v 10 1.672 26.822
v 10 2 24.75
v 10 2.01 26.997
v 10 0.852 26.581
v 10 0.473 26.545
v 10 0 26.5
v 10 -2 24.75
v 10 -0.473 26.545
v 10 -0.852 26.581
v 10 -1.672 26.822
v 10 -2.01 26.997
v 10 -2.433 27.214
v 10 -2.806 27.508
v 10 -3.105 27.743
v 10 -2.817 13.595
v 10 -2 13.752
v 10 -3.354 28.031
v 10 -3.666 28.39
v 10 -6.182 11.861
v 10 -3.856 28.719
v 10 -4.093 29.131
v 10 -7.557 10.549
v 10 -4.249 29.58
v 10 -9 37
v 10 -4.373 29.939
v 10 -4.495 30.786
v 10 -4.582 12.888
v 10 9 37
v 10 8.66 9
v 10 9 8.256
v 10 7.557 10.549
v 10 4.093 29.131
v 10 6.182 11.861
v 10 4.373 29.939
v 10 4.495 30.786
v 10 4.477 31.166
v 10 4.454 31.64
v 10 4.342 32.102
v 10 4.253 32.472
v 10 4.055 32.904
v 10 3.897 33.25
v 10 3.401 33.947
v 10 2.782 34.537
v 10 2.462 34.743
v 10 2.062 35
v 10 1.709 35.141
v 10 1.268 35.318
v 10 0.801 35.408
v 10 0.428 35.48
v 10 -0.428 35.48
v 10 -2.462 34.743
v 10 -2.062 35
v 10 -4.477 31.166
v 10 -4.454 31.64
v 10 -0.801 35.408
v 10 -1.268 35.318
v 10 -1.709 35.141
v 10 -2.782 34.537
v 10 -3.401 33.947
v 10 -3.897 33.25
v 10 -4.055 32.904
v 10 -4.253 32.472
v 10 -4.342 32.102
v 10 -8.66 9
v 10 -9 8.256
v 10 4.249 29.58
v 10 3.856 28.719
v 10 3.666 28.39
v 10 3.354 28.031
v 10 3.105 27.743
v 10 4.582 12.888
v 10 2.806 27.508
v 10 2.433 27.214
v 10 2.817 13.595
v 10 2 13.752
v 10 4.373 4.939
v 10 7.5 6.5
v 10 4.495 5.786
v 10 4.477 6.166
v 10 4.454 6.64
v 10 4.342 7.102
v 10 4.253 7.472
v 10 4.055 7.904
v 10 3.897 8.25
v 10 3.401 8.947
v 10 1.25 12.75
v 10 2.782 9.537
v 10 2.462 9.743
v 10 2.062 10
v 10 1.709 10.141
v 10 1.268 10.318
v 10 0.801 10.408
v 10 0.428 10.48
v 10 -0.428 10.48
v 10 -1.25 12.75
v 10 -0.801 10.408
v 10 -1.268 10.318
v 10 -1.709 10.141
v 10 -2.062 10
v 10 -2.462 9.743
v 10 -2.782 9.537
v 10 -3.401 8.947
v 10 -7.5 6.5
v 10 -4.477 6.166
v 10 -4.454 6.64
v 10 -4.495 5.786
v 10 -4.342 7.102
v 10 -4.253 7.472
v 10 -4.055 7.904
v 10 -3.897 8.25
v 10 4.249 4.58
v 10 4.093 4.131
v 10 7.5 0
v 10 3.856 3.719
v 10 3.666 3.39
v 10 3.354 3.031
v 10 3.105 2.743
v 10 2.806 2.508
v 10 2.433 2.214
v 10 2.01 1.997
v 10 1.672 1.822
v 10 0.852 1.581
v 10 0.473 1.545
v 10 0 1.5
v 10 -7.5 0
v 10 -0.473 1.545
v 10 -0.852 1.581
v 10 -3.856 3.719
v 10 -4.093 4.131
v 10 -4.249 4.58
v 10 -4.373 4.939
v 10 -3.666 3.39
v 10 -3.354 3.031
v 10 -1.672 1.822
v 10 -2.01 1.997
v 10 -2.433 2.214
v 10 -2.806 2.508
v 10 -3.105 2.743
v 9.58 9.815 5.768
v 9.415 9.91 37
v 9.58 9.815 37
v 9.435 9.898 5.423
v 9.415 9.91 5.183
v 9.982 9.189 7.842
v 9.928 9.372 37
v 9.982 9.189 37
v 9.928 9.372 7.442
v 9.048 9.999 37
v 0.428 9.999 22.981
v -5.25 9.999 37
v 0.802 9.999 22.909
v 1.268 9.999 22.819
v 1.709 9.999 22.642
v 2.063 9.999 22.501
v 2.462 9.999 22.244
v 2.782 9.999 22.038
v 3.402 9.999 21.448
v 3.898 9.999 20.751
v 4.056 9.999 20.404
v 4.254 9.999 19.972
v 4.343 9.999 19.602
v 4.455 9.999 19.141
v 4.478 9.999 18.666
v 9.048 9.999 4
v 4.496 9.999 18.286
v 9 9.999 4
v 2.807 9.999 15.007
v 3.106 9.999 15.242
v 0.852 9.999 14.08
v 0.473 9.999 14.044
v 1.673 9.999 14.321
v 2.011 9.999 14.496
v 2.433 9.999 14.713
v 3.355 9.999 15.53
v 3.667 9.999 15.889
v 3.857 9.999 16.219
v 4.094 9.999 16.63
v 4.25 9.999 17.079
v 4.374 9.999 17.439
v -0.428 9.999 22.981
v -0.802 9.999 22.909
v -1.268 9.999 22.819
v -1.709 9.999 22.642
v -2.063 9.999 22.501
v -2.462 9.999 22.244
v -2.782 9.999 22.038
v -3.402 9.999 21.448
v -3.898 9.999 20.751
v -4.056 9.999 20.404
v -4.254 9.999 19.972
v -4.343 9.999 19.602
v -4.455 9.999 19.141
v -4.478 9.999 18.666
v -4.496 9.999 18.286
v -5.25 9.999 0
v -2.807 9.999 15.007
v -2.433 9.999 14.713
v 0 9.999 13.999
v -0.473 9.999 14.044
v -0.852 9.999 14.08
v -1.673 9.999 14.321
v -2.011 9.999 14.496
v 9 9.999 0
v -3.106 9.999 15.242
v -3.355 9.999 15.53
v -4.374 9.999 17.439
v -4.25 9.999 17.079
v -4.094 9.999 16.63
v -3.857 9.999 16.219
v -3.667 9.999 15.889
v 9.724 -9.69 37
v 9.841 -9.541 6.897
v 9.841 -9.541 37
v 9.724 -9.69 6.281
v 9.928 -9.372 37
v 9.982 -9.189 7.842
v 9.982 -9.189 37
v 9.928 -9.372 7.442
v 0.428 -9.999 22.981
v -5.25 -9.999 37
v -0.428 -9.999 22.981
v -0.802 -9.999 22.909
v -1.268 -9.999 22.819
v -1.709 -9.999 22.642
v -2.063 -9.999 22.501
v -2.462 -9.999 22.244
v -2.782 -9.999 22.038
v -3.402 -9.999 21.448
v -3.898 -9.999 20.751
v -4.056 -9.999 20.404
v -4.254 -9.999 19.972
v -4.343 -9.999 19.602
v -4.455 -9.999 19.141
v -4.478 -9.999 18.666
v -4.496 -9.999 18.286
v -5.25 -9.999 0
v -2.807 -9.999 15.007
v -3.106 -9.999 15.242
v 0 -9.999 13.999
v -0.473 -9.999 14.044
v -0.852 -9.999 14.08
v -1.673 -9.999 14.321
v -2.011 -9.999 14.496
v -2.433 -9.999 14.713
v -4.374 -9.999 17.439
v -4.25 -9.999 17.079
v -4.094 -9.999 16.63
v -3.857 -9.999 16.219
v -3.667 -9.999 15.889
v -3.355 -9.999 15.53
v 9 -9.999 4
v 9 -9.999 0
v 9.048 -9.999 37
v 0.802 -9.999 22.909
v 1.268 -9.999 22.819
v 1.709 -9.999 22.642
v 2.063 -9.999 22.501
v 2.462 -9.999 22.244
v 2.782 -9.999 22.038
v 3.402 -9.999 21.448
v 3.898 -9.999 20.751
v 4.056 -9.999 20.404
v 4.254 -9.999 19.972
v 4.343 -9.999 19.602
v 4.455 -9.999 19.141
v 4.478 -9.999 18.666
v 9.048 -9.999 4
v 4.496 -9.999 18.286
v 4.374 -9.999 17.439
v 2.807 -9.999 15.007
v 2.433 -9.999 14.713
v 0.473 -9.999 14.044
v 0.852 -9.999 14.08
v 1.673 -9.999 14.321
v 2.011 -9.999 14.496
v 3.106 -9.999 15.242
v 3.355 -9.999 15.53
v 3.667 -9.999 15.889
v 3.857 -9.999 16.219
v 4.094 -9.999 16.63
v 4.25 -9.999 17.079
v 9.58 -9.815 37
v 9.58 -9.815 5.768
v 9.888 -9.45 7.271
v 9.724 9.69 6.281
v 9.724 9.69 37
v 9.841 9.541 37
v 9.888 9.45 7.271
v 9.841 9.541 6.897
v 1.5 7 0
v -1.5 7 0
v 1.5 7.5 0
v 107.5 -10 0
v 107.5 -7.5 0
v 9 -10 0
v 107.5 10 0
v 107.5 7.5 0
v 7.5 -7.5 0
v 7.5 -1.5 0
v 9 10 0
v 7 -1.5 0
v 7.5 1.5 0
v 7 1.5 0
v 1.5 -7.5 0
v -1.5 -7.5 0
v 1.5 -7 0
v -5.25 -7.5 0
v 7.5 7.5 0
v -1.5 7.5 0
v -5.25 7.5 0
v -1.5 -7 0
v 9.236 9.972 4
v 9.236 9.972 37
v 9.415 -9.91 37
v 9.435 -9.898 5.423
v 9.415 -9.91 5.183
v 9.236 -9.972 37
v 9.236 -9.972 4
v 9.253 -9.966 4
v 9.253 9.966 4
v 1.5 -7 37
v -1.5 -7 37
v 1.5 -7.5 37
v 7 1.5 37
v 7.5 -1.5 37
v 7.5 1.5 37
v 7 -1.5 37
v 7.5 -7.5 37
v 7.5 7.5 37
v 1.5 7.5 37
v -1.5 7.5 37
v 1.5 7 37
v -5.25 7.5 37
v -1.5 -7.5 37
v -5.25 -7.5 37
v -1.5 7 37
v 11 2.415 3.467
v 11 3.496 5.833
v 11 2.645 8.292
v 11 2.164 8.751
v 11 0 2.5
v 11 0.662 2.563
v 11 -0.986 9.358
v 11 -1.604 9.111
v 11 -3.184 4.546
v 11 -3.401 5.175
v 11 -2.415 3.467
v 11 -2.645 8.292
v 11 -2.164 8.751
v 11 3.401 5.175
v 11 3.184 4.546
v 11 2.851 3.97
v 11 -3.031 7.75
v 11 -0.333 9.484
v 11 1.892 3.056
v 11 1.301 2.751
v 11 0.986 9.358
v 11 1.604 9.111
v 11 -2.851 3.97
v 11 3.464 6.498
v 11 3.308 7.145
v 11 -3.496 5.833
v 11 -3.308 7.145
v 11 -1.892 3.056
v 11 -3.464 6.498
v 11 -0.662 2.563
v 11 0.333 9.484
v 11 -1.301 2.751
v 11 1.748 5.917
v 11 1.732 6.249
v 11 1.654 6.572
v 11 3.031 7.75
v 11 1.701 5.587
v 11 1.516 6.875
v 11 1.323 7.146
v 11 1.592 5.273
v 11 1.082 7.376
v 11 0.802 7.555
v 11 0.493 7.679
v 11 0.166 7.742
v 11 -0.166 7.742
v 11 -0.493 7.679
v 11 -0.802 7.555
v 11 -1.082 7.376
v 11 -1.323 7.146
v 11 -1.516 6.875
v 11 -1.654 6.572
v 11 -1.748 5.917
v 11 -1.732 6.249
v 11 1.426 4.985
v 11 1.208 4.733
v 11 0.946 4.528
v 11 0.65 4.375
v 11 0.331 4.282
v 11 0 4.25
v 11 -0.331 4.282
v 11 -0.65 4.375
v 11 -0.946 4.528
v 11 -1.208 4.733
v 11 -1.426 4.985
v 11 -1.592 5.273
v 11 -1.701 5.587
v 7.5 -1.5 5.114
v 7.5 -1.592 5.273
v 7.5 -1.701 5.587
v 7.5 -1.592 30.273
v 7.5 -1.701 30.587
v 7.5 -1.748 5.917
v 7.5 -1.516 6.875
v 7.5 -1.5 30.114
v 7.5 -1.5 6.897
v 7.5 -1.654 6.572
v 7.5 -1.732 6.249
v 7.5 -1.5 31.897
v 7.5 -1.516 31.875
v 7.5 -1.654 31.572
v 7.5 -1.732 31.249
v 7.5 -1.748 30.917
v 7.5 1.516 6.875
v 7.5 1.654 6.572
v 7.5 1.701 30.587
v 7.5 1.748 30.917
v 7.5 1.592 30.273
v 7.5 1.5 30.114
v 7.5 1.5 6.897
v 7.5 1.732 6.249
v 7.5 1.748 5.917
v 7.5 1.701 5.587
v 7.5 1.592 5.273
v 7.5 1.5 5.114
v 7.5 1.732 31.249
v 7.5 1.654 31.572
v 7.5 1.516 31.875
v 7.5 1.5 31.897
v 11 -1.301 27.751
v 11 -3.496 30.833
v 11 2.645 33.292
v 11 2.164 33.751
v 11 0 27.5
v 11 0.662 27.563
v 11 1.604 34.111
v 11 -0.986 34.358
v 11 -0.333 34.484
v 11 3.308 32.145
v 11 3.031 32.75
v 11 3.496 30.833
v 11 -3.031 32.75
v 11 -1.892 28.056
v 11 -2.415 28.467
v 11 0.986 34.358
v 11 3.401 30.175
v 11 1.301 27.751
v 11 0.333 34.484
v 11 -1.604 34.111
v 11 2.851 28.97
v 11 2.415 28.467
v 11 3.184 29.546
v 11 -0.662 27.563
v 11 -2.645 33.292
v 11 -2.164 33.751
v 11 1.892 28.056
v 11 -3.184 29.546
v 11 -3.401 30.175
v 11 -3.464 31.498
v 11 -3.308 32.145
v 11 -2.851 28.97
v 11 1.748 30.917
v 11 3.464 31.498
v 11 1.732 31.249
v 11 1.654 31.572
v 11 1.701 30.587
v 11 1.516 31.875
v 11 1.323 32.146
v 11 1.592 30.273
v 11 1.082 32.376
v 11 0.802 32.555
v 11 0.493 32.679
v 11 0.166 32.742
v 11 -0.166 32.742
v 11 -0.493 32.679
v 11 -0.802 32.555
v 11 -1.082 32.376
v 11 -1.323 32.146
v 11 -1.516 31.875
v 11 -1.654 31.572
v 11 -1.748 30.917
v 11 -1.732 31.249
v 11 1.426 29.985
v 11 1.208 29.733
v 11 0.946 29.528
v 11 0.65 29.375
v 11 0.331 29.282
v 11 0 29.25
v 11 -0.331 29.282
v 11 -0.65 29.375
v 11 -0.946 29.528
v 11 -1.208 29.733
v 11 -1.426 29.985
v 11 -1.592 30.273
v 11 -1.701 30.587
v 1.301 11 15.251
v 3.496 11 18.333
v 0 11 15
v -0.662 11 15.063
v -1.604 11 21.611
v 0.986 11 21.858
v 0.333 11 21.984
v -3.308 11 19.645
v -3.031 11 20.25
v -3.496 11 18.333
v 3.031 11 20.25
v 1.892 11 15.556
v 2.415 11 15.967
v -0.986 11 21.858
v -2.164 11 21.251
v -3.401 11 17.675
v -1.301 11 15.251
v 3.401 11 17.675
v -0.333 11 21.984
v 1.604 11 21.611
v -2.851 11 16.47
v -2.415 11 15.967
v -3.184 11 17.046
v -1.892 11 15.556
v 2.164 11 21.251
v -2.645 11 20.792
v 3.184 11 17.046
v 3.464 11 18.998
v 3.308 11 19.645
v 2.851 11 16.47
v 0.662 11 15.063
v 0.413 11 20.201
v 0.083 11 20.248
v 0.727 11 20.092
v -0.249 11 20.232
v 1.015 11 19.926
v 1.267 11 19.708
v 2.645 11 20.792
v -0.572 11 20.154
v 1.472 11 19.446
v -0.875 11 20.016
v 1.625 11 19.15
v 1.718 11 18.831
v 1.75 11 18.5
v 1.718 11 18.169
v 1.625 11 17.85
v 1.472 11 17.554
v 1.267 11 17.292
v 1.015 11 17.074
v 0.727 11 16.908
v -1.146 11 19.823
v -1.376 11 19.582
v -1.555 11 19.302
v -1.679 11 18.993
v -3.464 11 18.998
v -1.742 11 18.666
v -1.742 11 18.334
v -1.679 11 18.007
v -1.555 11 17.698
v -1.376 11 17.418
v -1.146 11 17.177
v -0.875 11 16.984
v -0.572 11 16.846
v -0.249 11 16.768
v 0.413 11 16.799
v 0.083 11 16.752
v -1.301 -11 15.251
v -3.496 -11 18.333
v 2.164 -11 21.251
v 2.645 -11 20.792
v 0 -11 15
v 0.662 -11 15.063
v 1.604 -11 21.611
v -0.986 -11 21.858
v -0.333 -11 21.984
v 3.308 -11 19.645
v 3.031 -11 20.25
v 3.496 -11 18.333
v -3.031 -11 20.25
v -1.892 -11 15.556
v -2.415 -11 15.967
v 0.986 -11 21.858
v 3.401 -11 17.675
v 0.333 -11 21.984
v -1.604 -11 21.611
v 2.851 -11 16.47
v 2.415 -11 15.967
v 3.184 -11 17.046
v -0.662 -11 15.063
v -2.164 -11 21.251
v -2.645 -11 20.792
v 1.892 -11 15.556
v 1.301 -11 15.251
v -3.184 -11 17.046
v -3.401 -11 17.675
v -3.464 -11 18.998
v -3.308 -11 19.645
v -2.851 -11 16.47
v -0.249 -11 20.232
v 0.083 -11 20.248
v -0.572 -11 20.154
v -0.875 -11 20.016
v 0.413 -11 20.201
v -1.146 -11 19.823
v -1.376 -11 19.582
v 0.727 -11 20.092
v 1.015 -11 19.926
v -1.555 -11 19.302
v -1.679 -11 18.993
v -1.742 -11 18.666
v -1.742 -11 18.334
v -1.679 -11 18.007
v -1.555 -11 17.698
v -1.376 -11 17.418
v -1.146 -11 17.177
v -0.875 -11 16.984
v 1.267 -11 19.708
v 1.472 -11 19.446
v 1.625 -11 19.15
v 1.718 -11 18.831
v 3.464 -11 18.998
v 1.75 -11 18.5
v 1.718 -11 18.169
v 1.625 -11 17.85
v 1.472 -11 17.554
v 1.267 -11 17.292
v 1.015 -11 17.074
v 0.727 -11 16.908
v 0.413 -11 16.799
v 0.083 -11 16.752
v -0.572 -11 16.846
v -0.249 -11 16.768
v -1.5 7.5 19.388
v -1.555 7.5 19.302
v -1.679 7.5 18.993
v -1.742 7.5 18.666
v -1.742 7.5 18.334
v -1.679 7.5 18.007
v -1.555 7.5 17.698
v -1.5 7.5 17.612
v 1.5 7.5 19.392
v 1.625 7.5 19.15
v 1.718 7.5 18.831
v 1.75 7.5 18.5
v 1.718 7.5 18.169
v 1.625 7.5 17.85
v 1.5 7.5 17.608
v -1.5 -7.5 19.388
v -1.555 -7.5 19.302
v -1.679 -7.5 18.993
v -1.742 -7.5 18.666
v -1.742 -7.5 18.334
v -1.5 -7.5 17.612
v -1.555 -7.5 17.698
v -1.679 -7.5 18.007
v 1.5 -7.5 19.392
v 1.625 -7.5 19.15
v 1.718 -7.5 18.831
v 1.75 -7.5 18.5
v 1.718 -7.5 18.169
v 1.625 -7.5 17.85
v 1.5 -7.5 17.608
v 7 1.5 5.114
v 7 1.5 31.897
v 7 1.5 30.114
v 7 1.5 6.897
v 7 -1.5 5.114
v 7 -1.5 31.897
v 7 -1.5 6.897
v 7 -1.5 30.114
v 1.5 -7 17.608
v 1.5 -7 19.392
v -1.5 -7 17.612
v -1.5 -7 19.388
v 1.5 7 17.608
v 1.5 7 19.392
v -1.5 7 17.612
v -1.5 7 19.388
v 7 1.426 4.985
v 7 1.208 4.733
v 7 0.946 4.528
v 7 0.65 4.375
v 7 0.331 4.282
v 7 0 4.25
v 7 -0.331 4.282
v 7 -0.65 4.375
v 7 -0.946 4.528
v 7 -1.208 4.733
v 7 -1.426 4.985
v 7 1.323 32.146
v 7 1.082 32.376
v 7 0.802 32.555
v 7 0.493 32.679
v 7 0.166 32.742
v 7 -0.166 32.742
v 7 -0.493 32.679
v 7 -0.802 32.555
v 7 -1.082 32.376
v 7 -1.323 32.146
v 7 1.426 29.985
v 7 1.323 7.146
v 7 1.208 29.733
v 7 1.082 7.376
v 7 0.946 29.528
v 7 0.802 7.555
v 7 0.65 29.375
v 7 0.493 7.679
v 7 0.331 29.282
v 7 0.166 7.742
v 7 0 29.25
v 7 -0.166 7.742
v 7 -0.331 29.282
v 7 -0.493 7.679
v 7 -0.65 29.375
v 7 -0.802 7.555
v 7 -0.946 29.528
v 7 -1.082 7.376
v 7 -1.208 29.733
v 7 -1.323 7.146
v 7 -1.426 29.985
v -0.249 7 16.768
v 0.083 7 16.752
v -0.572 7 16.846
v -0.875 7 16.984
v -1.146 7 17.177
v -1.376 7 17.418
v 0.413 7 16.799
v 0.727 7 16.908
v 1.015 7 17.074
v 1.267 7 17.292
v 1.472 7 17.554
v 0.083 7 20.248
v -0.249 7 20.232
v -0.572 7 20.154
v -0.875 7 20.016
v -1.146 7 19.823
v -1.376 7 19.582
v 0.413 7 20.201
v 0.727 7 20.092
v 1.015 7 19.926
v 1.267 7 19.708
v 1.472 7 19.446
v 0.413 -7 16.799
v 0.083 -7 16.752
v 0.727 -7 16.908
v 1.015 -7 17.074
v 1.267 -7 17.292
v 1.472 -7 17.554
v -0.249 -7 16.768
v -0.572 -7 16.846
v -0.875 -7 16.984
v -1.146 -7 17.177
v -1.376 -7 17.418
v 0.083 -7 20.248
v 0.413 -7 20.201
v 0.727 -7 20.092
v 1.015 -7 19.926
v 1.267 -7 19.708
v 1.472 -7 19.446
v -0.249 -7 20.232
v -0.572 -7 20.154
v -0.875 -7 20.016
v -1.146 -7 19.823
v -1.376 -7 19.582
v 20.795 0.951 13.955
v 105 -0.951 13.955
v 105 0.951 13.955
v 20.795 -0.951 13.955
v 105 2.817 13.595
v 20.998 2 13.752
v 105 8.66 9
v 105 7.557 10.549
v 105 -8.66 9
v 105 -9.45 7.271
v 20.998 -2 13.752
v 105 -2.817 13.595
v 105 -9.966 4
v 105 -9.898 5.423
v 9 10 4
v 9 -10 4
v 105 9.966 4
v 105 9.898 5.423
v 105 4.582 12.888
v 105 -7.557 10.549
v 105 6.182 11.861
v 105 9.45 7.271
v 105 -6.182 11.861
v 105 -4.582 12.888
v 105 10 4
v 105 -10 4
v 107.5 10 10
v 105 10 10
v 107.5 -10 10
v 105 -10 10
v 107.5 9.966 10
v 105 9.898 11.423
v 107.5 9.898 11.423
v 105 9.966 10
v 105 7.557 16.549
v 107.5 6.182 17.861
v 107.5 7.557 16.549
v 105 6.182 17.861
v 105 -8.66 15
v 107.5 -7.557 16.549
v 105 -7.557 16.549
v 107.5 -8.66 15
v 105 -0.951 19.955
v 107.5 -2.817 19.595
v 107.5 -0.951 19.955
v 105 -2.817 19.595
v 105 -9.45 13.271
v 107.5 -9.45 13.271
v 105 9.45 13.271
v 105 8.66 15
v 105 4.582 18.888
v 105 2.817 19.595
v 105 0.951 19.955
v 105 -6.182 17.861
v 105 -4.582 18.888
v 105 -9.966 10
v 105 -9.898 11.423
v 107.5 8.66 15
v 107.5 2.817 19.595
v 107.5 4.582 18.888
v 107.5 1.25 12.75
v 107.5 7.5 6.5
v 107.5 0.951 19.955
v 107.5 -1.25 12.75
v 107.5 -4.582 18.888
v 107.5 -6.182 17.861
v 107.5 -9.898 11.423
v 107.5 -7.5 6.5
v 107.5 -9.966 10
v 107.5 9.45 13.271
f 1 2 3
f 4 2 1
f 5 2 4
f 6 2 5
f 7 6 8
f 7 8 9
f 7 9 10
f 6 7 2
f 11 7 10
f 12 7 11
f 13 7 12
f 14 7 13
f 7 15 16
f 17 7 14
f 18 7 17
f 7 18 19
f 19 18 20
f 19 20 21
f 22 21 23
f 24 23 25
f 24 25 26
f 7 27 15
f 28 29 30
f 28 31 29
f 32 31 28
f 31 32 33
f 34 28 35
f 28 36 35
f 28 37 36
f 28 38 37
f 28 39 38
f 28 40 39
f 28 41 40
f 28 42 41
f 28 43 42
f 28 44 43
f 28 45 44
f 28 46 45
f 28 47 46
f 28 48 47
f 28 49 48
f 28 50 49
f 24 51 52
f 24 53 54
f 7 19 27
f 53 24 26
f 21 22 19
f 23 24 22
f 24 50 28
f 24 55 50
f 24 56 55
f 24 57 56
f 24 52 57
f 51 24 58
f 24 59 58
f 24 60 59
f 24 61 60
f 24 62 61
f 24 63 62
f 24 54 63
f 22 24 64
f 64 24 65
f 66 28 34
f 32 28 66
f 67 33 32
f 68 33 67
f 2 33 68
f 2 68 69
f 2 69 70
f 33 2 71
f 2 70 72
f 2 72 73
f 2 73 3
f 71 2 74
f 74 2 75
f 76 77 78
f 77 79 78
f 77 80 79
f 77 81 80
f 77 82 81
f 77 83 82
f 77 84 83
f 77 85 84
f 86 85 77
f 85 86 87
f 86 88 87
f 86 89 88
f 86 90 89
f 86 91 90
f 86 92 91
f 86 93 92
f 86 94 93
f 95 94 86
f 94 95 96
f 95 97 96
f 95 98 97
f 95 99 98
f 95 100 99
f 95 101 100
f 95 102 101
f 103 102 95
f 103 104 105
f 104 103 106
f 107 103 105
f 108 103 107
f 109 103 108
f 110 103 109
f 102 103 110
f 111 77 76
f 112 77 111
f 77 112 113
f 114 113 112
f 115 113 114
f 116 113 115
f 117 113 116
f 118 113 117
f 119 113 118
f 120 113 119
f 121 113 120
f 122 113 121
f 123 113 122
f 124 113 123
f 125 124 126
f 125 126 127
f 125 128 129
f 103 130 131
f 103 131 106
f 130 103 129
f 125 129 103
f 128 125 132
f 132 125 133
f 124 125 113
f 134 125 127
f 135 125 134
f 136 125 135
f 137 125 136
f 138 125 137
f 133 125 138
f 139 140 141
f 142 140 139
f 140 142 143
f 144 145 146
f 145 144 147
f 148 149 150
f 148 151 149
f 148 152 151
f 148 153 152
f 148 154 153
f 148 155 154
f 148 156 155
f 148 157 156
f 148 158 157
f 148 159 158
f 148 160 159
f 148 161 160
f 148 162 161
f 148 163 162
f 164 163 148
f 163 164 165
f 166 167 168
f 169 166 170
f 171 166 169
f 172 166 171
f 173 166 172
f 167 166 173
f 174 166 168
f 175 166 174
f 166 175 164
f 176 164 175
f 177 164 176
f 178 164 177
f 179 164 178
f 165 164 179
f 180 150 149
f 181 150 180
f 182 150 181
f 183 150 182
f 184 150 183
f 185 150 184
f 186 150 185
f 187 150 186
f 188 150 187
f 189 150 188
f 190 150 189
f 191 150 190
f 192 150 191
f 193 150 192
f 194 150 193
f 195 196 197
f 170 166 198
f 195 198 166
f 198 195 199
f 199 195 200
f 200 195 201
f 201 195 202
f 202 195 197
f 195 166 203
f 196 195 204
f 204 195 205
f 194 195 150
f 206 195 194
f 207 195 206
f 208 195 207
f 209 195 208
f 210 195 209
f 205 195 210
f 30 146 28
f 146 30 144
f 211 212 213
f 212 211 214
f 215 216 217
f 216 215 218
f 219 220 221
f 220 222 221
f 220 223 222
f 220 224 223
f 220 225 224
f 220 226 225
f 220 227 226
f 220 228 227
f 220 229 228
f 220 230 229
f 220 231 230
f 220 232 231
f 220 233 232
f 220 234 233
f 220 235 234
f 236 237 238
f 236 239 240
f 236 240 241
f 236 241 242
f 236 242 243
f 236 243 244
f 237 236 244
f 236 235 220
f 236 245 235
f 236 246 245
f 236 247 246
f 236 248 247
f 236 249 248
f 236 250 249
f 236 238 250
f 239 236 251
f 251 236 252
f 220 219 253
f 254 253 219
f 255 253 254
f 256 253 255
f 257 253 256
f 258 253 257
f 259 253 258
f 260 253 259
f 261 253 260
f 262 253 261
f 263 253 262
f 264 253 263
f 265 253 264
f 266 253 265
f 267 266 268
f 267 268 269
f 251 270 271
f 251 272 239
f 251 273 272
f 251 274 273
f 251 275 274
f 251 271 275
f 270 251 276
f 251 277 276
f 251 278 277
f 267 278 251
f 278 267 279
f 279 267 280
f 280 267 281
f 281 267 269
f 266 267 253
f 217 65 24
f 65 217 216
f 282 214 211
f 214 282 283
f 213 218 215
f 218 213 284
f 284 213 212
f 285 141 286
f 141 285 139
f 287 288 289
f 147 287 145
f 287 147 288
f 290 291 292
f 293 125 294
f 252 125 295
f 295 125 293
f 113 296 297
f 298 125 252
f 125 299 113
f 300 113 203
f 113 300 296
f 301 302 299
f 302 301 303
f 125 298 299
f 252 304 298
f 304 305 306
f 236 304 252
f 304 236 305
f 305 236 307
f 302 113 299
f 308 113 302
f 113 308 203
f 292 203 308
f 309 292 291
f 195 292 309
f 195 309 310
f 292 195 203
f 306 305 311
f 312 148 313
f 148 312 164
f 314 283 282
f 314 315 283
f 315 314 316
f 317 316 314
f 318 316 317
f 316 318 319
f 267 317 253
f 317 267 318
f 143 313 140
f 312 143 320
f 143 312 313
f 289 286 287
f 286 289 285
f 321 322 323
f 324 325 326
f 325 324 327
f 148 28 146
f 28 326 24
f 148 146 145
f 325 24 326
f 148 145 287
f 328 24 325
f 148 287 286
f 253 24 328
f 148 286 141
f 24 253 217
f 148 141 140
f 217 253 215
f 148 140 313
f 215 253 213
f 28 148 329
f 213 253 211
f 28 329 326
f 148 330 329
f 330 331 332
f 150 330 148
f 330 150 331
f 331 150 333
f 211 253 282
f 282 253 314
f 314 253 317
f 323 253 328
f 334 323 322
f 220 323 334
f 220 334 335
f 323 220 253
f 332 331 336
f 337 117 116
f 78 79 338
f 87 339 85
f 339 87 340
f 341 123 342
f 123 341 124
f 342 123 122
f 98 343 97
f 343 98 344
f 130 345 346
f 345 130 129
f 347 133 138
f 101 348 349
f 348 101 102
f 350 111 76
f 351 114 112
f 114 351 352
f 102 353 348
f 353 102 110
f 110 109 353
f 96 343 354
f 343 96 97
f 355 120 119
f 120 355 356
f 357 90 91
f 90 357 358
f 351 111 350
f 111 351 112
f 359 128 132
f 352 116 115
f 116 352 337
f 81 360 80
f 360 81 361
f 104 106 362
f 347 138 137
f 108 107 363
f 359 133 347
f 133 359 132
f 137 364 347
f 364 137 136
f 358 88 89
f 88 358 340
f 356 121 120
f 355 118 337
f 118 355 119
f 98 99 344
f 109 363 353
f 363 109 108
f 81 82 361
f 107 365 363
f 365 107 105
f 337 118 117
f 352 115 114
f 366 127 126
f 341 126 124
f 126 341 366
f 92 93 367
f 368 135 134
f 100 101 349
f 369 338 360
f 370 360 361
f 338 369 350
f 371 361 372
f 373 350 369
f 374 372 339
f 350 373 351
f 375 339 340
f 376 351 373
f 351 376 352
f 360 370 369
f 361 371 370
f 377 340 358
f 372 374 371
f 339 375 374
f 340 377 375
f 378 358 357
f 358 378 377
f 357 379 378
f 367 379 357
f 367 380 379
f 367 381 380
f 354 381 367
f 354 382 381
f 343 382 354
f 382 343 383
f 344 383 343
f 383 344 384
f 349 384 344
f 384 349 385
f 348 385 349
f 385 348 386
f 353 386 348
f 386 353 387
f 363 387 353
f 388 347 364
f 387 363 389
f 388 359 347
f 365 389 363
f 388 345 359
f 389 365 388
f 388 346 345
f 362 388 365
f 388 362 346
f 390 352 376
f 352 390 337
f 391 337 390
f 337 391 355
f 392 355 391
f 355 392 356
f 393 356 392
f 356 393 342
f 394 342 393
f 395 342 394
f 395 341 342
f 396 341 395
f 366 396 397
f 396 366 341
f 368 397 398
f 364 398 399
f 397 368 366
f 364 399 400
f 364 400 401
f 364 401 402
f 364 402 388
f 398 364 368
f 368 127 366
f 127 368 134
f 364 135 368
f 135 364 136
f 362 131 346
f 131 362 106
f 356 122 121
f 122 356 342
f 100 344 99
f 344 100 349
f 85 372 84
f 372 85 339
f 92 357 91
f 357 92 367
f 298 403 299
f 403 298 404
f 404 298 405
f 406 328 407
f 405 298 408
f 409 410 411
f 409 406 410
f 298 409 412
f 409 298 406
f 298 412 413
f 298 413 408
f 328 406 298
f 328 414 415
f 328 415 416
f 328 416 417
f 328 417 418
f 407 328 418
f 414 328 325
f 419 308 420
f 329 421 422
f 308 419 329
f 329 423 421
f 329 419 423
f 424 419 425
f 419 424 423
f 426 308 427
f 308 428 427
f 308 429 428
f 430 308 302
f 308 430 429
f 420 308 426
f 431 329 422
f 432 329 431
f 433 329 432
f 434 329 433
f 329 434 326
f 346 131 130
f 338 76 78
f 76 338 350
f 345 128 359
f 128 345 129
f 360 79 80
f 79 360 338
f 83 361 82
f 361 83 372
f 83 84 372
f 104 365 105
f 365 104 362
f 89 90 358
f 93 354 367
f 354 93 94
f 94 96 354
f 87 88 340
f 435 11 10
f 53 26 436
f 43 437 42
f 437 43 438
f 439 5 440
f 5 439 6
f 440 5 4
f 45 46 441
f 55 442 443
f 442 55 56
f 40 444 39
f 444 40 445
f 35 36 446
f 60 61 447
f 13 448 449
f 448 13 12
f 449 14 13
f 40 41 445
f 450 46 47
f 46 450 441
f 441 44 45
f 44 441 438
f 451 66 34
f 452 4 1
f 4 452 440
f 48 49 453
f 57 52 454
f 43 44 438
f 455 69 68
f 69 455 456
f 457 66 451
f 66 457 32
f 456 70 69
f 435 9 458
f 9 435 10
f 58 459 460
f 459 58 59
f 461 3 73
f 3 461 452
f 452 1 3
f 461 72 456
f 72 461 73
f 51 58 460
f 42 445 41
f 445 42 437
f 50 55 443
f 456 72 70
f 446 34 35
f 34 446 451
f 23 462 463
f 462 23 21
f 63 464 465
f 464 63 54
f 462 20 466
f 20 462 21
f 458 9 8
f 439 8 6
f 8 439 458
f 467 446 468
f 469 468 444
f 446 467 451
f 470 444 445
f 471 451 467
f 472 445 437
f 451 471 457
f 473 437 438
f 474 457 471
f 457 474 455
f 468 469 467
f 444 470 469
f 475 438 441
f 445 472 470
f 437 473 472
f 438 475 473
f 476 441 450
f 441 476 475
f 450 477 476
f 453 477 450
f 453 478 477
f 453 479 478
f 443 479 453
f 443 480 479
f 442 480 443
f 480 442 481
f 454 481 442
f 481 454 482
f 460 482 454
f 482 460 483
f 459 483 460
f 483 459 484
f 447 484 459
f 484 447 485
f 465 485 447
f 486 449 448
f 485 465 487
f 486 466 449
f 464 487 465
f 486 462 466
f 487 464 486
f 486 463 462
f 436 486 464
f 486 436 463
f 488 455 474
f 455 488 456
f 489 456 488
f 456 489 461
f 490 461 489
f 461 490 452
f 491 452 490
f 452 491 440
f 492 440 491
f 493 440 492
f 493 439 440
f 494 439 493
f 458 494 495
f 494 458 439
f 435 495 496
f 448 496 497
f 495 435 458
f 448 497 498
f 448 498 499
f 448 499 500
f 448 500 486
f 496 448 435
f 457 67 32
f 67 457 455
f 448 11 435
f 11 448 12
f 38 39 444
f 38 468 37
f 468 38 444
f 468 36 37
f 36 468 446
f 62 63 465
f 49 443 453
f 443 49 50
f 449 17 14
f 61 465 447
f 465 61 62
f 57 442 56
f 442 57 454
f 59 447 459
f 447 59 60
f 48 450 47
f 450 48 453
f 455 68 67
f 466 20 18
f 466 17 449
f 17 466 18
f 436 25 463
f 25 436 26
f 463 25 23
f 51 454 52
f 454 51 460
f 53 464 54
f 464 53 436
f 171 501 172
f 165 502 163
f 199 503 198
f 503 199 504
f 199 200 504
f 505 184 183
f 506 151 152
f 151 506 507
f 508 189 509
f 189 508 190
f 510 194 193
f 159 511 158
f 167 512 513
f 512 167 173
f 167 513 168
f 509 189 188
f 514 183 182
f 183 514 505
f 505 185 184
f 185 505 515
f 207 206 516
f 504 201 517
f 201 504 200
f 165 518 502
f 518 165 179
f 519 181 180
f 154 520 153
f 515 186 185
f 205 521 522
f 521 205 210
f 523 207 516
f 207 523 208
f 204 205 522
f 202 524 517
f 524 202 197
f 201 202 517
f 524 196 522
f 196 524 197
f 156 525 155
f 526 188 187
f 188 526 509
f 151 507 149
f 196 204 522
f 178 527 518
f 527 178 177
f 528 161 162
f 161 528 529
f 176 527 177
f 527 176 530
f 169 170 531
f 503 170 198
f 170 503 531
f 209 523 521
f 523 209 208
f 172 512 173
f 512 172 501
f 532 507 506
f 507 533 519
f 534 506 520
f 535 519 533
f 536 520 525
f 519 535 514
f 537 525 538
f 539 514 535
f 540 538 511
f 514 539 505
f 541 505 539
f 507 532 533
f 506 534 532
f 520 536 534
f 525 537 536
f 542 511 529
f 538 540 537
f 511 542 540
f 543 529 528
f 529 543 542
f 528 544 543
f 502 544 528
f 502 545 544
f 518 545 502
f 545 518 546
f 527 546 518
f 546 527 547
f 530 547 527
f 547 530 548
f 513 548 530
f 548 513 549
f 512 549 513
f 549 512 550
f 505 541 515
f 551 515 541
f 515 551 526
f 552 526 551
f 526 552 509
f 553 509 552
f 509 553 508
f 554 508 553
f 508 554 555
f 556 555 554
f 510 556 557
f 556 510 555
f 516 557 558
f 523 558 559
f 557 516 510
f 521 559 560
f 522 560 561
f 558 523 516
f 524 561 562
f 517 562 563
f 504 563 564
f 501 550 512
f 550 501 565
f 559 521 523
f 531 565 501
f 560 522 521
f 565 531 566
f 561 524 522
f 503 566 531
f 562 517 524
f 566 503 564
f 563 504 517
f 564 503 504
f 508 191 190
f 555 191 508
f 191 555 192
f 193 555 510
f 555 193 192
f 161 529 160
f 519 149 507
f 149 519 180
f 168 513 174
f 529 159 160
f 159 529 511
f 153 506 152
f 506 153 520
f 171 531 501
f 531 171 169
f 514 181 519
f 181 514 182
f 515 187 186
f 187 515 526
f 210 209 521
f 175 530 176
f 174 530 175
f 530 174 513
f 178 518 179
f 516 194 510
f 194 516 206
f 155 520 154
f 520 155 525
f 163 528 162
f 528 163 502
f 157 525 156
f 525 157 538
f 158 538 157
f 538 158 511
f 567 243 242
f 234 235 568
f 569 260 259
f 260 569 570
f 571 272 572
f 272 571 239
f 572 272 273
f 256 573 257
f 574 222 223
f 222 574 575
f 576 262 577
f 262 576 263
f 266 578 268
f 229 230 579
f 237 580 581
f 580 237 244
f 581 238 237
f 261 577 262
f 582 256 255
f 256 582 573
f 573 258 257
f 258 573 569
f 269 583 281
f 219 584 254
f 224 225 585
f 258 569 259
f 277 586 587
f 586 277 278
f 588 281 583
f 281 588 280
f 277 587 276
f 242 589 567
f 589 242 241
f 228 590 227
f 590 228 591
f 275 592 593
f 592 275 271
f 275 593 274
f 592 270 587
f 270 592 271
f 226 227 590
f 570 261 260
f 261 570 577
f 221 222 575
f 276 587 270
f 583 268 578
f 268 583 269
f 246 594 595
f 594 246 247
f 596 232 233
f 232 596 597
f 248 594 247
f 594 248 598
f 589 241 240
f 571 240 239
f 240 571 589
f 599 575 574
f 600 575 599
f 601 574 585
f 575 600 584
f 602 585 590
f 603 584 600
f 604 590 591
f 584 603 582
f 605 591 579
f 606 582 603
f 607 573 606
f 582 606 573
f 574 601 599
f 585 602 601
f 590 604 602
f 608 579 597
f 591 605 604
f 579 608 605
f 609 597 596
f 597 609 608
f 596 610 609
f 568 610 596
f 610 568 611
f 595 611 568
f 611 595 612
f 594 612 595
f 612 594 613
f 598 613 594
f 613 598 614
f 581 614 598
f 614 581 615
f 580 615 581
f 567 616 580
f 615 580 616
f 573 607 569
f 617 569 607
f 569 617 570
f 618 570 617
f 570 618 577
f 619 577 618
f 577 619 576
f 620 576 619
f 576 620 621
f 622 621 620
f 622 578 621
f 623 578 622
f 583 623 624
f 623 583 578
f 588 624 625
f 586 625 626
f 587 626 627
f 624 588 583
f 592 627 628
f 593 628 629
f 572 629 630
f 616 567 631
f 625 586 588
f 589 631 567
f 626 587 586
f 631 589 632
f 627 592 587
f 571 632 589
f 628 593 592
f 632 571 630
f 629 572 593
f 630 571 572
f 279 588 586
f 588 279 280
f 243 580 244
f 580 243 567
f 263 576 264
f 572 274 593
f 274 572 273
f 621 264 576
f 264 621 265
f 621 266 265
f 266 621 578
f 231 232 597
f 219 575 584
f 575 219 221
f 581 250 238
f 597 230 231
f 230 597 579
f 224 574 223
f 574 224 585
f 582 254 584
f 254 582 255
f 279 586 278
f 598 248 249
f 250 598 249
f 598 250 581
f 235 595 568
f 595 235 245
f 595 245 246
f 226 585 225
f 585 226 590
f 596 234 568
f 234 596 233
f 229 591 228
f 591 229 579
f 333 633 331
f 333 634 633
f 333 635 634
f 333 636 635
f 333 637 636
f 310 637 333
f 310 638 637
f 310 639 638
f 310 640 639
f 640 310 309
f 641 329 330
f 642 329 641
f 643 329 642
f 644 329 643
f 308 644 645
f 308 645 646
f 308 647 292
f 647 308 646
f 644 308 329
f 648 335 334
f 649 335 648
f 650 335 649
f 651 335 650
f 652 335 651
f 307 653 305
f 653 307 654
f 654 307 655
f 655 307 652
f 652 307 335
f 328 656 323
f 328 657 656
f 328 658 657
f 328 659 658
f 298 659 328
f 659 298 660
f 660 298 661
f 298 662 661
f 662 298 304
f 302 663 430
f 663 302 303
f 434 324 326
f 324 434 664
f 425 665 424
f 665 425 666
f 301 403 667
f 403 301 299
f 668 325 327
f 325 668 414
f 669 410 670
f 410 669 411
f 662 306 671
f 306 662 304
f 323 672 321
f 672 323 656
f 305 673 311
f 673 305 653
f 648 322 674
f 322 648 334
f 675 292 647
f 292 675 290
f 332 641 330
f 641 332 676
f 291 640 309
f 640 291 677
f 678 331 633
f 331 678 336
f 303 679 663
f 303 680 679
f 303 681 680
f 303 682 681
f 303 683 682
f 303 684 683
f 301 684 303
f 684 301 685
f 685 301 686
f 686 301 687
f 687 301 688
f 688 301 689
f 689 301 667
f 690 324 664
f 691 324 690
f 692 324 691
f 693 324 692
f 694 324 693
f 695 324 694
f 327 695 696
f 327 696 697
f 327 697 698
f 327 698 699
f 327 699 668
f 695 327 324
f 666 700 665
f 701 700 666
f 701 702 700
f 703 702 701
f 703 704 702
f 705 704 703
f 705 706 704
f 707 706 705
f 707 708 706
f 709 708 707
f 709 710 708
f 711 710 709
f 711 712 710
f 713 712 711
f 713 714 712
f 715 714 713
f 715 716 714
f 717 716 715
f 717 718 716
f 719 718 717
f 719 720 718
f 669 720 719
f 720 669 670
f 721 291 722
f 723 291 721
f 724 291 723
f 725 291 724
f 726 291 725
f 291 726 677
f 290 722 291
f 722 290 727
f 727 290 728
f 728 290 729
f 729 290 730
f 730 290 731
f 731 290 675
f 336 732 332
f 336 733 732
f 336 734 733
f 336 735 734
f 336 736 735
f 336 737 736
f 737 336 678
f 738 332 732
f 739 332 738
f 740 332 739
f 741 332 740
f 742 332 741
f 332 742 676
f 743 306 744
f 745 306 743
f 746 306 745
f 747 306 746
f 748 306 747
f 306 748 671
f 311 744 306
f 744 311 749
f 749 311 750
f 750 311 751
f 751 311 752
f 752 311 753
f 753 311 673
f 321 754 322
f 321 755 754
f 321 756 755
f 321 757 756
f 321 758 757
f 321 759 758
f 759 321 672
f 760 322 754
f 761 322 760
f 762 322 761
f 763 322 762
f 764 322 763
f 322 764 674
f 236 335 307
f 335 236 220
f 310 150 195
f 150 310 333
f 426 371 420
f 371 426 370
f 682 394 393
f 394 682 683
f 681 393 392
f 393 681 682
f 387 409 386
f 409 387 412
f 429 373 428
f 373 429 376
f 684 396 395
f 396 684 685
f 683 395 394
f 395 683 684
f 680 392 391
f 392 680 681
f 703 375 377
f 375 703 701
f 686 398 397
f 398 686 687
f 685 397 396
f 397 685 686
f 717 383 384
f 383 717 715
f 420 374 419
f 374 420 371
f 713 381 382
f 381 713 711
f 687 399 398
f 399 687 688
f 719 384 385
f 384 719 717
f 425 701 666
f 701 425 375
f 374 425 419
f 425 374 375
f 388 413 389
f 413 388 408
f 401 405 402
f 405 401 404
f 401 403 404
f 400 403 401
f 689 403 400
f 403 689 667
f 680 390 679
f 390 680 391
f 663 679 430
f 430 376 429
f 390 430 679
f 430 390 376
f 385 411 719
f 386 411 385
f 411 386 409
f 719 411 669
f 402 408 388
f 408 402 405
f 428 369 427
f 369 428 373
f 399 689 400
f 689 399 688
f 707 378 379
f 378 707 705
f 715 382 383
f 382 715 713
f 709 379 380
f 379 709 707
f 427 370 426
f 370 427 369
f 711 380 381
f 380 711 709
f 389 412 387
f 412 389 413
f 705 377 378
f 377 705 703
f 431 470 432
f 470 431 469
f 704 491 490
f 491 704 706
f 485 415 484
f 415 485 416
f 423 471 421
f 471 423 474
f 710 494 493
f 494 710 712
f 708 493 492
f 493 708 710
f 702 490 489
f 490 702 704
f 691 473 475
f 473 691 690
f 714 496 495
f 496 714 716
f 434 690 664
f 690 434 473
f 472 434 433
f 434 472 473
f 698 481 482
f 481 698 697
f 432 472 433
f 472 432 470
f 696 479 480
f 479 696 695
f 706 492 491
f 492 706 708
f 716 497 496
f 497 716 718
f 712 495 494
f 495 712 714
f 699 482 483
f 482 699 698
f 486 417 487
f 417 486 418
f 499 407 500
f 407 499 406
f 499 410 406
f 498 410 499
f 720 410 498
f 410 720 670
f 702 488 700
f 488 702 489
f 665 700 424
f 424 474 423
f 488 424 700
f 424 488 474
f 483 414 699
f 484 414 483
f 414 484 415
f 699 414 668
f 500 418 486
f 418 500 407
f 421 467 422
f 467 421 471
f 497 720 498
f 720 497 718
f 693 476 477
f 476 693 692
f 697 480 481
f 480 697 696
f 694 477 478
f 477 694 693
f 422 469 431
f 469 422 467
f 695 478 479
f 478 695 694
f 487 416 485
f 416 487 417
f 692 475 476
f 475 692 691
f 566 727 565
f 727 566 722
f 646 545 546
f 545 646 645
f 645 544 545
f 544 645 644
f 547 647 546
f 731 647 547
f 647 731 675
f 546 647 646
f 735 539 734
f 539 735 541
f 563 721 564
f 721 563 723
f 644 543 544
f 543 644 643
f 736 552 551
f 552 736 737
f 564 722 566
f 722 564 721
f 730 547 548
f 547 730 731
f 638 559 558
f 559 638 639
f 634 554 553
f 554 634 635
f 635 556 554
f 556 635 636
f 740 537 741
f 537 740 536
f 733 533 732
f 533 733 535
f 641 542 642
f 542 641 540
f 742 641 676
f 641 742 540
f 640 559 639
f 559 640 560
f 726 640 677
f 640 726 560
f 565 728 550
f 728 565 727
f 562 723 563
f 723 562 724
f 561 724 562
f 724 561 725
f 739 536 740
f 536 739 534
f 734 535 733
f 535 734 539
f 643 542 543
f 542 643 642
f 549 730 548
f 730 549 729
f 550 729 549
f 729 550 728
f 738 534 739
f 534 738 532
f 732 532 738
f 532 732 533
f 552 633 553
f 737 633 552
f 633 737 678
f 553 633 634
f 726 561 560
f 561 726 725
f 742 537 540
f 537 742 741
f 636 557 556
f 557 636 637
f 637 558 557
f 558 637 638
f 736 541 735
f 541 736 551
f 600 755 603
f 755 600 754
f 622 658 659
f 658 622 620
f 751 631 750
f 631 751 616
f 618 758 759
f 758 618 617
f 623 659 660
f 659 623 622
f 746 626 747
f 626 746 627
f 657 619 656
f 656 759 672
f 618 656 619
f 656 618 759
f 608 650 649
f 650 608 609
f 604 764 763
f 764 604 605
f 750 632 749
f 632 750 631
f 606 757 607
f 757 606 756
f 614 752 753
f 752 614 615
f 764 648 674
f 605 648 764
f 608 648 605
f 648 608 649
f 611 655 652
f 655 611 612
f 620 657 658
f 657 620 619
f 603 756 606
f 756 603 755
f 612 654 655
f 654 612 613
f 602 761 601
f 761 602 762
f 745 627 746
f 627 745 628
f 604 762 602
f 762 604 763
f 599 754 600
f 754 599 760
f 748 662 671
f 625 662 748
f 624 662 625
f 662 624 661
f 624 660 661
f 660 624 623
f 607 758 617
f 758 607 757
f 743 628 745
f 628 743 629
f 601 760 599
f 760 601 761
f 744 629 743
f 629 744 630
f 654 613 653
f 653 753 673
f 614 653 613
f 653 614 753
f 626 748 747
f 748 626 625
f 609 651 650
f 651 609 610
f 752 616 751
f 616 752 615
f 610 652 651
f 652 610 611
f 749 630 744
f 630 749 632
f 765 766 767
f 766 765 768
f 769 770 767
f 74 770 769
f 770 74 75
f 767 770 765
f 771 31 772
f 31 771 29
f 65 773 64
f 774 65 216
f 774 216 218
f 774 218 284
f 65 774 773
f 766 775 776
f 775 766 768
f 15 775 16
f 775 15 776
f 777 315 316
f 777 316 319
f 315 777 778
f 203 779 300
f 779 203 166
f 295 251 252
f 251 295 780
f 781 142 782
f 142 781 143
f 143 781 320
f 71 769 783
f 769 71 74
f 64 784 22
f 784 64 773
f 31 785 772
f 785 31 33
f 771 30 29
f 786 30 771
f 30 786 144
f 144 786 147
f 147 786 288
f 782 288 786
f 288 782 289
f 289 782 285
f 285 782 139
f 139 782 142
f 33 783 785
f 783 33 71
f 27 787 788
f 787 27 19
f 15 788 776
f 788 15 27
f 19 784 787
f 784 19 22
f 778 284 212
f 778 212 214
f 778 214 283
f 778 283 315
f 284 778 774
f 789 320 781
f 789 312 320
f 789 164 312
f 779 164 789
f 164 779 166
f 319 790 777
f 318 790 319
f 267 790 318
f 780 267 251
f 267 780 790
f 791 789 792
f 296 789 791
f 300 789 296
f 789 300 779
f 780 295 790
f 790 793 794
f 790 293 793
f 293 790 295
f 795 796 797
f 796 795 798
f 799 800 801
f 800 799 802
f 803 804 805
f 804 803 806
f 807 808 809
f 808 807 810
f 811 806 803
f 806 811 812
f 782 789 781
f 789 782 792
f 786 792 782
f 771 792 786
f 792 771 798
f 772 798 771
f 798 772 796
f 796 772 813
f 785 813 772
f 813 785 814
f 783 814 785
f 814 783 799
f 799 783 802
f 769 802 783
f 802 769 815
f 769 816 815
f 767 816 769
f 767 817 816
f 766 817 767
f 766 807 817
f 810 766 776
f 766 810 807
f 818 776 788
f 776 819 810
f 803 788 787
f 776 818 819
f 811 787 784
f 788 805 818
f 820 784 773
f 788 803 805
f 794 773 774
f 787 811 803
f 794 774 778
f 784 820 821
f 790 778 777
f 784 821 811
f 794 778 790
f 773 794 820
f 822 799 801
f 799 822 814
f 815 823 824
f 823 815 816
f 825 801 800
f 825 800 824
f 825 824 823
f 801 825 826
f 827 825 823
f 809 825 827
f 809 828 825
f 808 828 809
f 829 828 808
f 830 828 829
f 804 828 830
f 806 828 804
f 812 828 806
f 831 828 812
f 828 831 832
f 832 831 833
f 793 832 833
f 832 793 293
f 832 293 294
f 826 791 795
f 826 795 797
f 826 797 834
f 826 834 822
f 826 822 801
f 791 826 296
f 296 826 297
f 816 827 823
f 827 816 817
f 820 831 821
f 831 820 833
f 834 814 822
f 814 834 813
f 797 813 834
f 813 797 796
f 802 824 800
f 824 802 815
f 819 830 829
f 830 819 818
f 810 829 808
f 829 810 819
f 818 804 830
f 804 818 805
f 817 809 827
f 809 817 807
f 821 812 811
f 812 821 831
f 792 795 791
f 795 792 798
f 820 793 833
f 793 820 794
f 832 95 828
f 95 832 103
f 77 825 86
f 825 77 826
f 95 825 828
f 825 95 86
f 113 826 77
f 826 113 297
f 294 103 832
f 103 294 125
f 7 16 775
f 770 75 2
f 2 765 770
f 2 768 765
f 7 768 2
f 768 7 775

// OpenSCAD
// Stephen Stair 2014 (sgstair@akkit.org)
// Openbeam Kossel Spool Holder
// Ground up recreation of the thing here: http://www.thingiverse.com/thing:209294


beamsize = 15;
beamgapwidth = 3;
beamgapdepth=3;

beam_grip = 0.5;

interface_height = 37;
interface_overlap = beamsize*.85;

interface_smooth = 1;

wall = 2.5;
screw_wall = 3.5;
screw_size = 3.5;
screw_reinforce_radius = 7/2;


screw_low = 6;
screw_mid = interface_height/2;
screw_high = interface_height-6;

holder_length = 95;
holder_radius = (beamsize+wall*2)/2;
holder_height = 4;
holder_retain = 6;

support_size = 12;
support_wall = 4;

$fs = 0.1;
$fa = 11;


module beam(length)
{
	difference() {
		translate([-beamsize/2,-beamsize/2,0])
			cube([beamsize,beamsize,length]);

		translate([-beamsize/2,0,0])
			cube([beamgapdepth*2,beamgapwidth,length*3],center=true);
		translate([beamsize/2,0,0])
			cube([beamgapdepth*2,beamgapwidth,length*3],center=true);

		translate([0,-beamsize/2,0])
			cube([beamgapwidth,beamgapdepth*2,length*3],center=true);
		translate([0,beamsize/2,0])
			cube([beamgapwidth,beamgapdepth*2,length*3],center=true);
   }
}


module screw_reinforce()
{
	rotate([0,90,0])
		cylinder(r1=screw_reinforce_radius+screw_wall, r2 = screw_reinforce_radius,h=screw_wall);
  
}

module beam_interface()
{
	difference() {
		union()
		{
			// core wall

			// Round corners of interface base surface.
			minkowski()
      	{
				translate([0,0,interface_height/2])
					cube([beamsize+wall*2-interface_smooth*2, beamsize+wall*2-interface_smooth*2, interface_height-1],center=true);

				cylinder(r = interface_smooth, h=1, center=true);
			}

			// Add reinforcement around screw holes
			translate([beamsize/2,0,screw_low])
				screw_reinforce();			

			translate([beamsize/2,0,screw_high])
				screw_reinforce();

			translate([0,beamsize/2,screw_mid])
				rotate([0,0,90])
					screw_reinforce();

			translate([0,-beamsize/2,screw_mid])
				rotate([0,0,-90])
					screw_reinforce();
		}


		cube([beamsize-beam_grip*2,beamsize-beam_grip*2,interface_height*3],center=true);

		translate([-beamsize*1.5-interface_overlap,0,0])
			cube([beamsize*4,beamsize*4,interface_height*3],center=true);

		translate([0,0,-5]) beam(10+interface_height);

		// Cut off anything above the top
		translate([-beamsize*2,-beamsize*2,interface_height])
			cube([beamsize*4,beamsize*4,beamsize*4]);

		// Cut off anything below the bottom
		translate([-beamsize*2,-beamsize*2,-beamsize*4])
			cube([beamsize*4,beamsize*4,beamsize*4]);



		// screw holes

		translate([beamsize/2-2,0,screw_low])
			rotate([0,90,0])
				#cylinder(r=screw_size/2,h=screw_wall+4);

		translate([beamsize/2-2,0,screw_high])
			rotate([0,90,0])
				#cylinder(r=screw_size/2,h=screw_wall+4);

		translate([0,beamsize/2-2,screw_mid])
			rotate([-90,0,0])
				#cylinder(r=screw_size/2,h=screw_wall+4);

		translate([0,-beamsize/2+2,screw_mid])
			rotate([90,0,0])
				#cylinder(r=screw_size/2,h=screw_wall+4);
	}
}

module holder()
{
   // Calculate size of shapes to be removed below the holder
	remove_base_height = holder_height + holder_radius - (holder_radius-wall);
   
	remove_start = beamsize/2+wall-2;
	remove_length = holder_length+wall*4;
	remove_base_width = holder_radius*2-wall*2;
   remove_angle_size = (holder_radius-wall)*sqrt(2);

	difference()
	{
		union()
		{
			translate([beamsize/2+wall-1,0,holder_height])
				rotate([0,90,0])
					cylinder(r=holder_radius,h=holder_length+2);

			translate([beamsize/2+wall-1, -holder_radius, 0])
				cube([holder_length+2, holder_radius*2, holder_height]);
	
			translate([beamsize/2+wall+holder_length,0,holder_height + holder_retain])
				rotate([0,90,0])
					cylinder(r=holder_radius,h=wall);
	
			translate([beamsize/2+wall+holder_length, -holder_radius, 0])
				cube([wall, holder_radius*2, holder_height+holder_retain]);
		}

		translate([0,-holder_radius*2,-holder_radius*2])
			cube([remove_length*2,holder_radius*4,holder_radius*2]);
		translate([remove_start,-remove_base_width/2, -holder_radius*2])
			cube([remove_length,remove_base_width, remove_base_height + holder_radius*2]);

		difference()
		{
			translate([0,0,remove_base_height])
				rotate([45,0,0])
					translate([remove_start,-remove_angle_size/2,-remove_angle_size/2])
				      cube([remove_length, remove_angle_size,remove_angle_size]);

			translate([0,-holder_radius*2,remove_base_height + holder_radius - wall*1.5])
				cube([remove_length*2, holder_radius*4, holder_radius]);
		}

	}
}

module support()
{
	base_size = support_size*2/sqrt(2);

	translate([beamsize/2+wall,0,holder_height + holder_radius - wall/2])
	difference()
	{
		rotate([90,45,0])
   		cube([base_size,base_size,support_wall],center=true);

		translate([-base_size*2-wall/2,-base_size,-base_size])
			cube([base_size*2,base_size*2,base_size*2]);

		translate([-base_size,-base_size,-base_size*2])
			cube([base_size*2,base_size*2,base_size*2]);

	}
}


union()
{
	beam_interface();
	holder();
	support();
}
